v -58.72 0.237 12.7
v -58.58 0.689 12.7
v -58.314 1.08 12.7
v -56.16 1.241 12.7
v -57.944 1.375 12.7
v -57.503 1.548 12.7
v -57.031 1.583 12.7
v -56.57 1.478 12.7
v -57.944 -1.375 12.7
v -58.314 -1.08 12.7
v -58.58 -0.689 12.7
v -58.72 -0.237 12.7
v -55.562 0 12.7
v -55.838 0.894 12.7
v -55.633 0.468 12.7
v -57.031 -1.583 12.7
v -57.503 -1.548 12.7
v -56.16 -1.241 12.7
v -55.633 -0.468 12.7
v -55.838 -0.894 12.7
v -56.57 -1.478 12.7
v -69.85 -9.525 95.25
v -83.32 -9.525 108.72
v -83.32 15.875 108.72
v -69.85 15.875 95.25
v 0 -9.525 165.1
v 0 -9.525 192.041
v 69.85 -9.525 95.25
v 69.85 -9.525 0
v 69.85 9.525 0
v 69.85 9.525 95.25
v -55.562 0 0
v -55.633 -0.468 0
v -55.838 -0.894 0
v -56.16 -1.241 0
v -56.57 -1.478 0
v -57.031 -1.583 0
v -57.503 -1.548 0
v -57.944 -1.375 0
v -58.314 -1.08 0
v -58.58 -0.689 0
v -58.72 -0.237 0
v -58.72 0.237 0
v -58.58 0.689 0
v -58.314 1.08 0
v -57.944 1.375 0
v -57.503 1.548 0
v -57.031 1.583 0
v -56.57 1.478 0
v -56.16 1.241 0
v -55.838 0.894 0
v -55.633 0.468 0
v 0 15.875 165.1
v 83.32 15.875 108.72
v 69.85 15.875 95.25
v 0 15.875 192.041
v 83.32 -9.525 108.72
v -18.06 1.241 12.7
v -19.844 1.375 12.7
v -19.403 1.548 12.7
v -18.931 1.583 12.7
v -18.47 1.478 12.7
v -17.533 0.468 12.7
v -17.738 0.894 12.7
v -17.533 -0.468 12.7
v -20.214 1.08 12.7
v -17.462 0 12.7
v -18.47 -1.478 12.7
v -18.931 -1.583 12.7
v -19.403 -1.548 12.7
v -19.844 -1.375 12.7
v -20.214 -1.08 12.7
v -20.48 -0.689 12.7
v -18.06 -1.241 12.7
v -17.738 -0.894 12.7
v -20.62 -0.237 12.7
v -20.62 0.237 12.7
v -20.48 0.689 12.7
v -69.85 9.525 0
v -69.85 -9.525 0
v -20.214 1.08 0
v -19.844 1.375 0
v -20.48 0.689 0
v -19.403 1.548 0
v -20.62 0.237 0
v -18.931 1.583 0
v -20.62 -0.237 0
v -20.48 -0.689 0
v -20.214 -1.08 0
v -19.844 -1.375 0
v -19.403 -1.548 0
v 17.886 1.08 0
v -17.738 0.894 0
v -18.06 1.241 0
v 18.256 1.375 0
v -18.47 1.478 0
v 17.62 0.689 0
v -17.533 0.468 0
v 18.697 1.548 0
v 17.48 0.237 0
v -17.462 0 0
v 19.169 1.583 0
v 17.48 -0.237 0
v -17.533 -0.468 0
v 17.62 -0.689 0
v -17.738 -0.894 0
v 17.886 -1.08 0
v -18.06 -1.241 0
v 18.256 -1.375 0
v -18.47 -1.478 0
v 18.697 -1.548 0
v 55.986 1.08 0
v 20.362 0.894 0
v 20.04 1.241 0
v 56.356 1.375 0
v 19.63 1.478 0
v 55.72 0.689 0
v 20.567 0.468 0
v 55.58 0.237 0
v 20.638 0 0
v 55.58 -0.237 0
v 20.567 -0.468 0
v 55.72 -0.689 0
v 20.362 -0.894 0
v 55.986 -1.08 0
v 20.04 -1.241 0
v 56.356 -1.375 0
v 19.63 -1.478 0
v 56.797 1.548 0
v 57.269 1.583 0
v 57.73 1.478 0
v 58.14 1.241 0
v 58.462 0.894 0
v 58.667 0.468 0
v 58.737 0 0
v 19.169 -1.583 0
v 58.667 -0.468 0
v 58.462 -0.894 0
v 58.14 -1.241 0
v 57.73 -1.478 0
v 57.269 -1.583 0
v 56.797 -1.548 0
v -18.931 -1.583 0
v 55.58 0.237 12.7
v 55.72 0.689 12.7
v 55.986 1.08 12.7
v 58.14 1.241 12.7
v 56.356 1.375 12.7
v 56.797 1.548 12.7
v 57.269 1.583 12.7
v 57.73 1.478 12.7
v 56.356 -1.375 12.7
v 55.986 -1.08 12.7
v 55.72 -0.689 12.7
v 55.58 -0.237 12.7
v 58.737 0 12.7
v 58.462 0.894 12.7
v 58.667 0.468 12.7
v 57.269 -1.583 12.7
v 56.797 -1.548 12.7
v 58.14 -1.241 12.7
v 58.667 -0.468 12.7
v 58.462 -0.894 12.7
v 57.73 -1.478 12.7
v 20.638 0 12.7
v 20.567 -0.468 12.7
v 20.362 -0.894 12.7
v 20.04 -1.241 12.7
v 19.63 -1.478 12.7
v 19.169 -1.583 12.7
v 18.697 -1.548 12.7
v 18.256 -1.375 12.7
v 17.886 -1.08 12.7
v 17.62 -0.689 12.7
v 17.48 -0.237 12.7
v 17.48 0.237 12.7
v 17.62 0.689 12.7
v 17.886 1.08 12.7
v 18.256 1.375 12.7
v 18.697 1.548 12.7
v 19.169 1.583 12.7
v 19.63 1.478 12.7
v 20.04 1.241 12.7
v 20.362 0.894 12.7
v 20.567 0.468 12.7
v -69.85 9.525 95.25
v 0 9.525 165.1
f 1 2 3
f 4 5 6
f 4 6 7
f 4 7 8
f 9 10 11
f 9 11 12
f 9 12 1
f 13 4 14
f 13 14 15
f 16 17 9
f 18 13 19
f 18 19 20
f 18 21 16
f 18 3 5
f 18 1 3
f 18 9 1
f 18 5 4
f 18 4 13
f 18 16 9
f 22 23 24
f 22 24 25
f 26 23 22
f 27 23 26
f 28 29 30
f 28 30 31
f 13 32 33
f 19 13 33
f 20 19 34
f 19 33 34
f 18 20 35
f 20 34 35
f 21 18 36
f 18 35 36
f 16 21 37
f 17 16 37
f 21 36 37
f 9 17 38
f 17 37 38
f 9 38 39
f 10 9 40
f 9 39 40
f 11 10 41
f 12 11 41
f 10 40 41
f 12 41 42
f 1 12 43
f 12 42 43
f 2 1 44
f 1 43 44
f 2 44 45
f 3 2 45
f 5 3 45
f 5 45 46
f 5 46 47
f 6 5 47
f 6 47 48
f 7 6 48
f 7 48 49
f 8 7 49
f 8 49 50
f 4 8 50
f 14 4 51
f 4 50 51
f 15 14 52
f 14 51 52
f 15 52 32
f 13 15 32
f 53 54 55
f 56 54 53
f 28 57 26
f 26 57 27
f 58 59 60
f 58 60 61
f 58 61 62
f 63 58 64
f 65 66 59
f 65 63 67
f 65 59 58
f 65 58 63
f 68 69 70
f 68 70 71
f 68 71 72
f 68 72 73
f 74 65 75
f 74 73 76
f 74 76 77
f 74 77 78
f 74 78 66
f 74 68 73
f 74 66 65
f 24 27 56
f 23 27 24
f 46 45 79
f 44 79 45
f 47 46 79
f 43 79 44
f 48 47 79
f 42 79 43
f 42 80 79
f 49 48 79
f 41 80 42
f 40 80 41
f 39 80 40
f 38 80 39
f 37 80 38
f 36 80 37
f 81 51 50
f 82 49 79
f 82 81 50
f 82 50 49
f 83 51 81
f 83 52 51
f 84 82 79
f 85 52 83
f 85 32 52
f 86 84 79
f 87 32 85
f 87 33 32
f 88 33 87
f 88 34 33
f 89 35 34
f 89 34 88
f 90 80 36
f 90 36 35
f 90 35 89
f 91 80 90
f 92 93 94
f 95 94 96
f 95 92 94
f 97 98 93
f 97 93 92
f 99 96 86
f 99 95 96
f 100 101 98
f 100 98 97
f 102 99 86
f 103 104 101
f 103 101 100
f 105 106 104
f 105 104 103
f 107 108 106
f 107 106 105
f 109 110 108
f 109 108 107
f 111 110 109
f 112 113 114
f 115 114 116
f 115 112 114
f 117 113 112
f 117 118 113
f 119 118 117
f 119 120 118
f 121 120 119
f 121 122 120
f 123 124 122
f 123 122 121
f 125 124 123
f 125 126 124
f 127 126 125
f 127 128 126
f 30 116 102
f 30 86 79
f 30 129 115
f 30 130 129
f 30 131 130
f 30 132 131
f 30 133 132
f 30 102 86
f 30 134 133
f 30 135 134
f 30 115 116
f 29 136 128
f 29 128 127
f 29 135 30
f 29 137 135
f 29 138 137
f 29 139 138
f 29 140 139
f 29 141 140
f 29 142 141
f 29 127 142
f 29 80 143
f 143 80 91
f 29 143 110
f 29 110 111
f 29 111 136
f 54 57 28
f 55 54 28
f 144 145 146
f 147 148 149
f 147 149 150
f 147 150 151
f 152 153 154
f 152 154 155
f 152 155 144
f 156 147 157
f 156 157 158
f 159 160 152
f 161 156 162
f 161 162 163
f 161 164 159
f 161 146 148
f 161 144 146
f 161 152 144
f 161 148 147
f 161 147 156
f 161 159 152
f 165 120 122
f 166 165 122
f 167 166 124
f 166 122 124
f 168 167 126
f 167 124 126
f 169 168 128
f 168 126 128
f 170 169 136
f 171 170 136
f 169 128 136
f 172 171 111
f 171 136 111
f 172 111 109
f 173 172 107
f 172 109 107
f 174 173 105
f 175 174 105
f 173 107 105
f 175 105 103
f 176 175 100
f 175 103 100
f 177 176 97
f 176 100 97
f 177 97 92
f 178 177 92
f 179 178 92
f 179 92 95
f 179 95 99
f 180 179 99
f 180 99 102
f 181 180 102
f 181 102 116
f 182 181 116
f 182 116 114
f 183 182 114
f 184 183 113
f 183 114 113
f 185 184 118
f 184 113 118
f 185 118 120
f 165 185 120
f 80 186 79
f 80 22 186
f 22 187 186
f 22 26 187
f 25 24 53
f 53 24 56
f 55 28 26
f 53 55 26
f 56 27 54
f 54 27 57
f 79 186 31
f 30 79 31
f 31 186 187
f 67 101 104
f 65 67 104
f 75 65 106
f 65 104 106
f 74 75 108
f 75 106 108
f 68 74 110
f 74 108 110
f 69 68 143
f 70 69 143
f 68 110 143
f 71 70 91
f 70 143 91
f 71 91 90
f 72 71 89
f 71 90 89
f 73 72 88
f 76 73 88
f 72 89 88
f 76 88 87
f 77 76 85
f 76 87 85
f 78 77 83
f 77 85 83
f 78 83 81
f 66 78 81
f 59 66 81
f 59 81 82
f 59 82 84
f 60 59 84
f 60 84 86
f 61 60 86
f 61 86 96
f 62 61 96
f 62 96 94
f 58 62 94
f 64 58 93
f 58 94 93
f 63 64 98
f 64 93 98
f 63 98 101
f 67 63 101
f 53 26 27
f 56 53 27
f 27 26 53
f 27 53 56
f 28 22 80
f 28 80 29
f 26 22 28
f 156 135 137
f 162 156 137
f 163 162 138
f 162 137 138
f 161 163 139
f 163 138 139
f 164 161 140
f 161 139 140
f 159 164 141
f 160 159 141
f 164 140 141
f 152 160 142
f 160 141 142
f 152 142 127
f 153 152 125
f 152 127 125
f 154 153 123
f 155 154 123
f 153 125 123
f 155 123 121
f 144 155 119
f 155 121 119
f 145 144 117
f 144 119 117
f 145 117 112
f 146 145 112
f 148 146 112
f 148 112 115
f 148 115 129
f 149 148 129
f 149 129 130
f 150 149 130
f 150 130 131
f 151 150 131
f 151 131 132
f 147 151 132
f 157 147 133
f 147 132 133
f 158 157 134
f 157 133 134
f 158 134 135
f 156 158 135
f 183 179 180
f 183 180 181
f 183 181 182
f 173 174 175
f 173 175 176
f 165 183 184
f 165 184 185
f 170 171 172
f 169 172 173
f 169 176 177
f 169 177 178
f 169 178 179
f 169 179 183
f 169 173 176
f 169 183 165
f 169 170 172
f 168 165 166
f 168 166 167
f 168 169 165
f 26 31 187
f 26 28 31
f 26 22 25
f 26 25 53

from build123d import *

# Parameters (mm, degrees)
F1_DEPTH = 9.525
F3_DEPTH = 25.4
F6_DEPTH = 12.7


with BuildPart() as f1:
    # F0 (on Front) → F1 (new body, symmetric)
    with BuildSketch(Plane.XZ):
        Polygon((-69.85, 95.25), (-69.85, 0), (69.85, 0), (69.85, 95.25), (0, 165.1), align=None)
    extrude(amount=F1_DEPTH, both=True)

    # F5 (on face) → F6 (cut)
    with BuildSketch(Plane(origin=(0, 0, 0), x_dir=(1, 0, 0), z_dir=(0, 0, -1))):
        with BuildLine():
            ThreePointArc((55.5625, 0), (57.15, -1.5875), (58.7375, 0))
            Line((58.7375, 0), (57.15, 0))
            Line((57.15, 0), (55.5625, 0))
        make_face()
        with BuildLine():
            Line((57.15, 0), (58.7375, 0))
            ThreePointArc((58.7375, 0), (57.15, 1.5875), (55.5625, 0))
            Line((55.5625, 0), (57.15, 0))
        make_face()
        with BuildLine():
            ThreePointArc((-58.7375, 0), (-57.15, -1.5875), (-55.5625, 0))
            Line((-55.5625, 0), (-57.15, 0))
            Line((-57.15, 0), (-58.7375, 0))
        make_face()
        with BuildLine():
            Line((-57.15, 0), (-55.5625, 0))
            ThreePointArc((-55.5625, 0), (-57.15, 1.5875), (-58.7375, 0))
            Line((-58.7375, 0), (-57.15, 0))
        make_face()
        with BuildLine():
            ThreePointArc((-20.6375, 0), (-19.05, -1.5875), (-17.4625, 0))
            Line((-17.4625, 0), (-19.05, 0))
            Line((-19.05, 0), (-20.6375, 0))
        make_face()
        with BuildLine():
            Line((-19.05, 0), (-17.4625, 0))
            ThreePointArc((-17.4625, 0), (-19.05, 1.5875), (-20.6375, 0))
            Line((-20.6375, 0), (-19.05, 0))
        make_face()
        with BuildLine():
            ThreePointArc((17.4625, 0), (19.05, -1.5875), (20.6375, 0))
            Line((20.6375, 0), (19.05, 0))
            Line((19.05, 0), (17.4625, 0))
        make_face()
        with BuildLine():
            Line((19.05, 0), (20.6375, 0))
            ThreePointArc((20.6375, 0), (19.05, 1.5875), (17.4625, 0))
            Line((17.4625, 0), (19.05, 0))
        make_face()
    extrude(amount=-F6_DEPTH, mode=Mode.SUBTRACT)


with BuildPart() as f3:
    # F2 (on face) → F3 (new body)
    with BuildSketch(Plane.XZ.offset(9.525)):
        Polygon((-83.320384, 108.720384), (-69.85, 95.25), (0, 165.1), (0, 192.040768), align=None)
    extrude(amount=-F3_DEPTH)


with BuildPart() as f4_1:
    # F4: instance of F3
    add(f3.part.mirror(Plane.YZ))


solid = Compound([f1.part, f3.part, f4_1.part])
